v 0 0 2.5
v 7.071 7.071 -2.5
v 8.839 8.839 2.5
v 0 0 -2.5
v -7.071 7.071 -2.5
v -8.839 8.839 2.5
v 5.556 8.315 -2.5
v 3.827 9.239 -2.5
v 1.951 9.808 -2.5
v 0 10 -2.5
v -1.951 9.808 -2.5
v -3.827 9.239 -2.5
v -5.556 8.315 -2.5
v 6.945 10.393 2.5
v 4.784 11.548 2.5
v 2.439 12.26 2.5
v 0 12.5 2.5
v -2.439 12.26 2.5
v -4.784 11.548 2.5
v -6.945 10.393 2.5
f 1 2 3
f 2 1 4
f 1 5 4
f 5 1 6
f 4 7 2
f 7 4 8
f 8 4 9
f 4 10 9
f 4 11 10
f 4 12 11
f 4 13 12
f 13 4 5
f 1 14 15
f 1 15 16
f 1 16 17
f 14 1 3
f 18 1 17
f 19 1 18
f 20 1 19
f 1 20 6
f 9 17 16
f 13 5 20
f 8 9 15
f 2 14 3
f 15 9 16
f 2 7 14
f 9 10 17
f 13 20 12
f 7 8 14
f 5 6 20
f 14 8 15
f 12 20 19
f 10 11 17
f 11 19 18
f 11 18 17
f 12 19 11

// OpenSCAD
// file: Cone.scad
// Auther: Tobias Grundtvig
// Date: Oct 1, 2020
//
// A cone, wraps the build-in cylinder module, to get consistent naming

Cone(bottom_diameter=20, top_diameter=10, height=10, t_x="neg");

module Cone(bottom_diameter,
            top_diameter,
            height,
            t_x="center",
            t_y="center",
            t_z="center",
            angular_resolution=32)
{
    max_d = max(bottom_diameter, top_diameter);
    tx = t_x == "neg" ? -max_d/2 : 
            t_x == "pos" ? max_d/2 : 0;
    ty = t_y == "neg" ? -max_d/2 : 
            t_y == "pos" ? max_d/2 : 0;
    tz = t_z == "neg" ? -height/2 : 
            t_z == "pos" ? height/2 : 0;
    translate([tx,ty,tz])
    cylinder(d1=bottom_diameter, d2=top_diameter, h=height, center=true, $fn=angular_resolution);
}
// file: Pie_2D.scad
// Auther: Tobias Grundtvig
// Date: Oct 1, 2020
//
//  A 2-dimensional pie
//  can be used to linear-extract a 3D Pie


Pie_2D(diameter=10, from_angle=45, to_angle=315, steps=32);
translate([2,0,0])
Pie_2D(diameter=10, from_angle=315, to_angle=45, steps=32);

module Pie_2D(diameter, from_angle, to_angle, steps=32)
{
    step_size = from_angle < to_angle ?
                (to_angle-from_angle)/steps :
                (360 - (from_angle-to_angle))/steps;
    r=diameter/2;
    points = from_angle < to_angle ?
        [
            for(i = [0:steps])
            [r * cos(from_angle+i*step_size), r * sin(from_angle+i*step_size)]
        ] :
        [
            for(i = [0:steps])
            [r * cos(from_angle+i*step_size), r * sin(from_angle+i*step_size)]
        ];
            
    polygon(concat([[0, 0]], points));
}
// main file
// Auther: Tobias Grundtvig
// Date: Oct 1, 2020
//
// A segment of a cone

use <Pie_2D.scad>
use <Cone.scad>

Cone_Segment(bottom_diameter=20, top_diameter=25, height=5, from_angle=45, to_angle=135);

module Cone_Segment(bottom_diameter,
                    top_diameter,
                    height,
                    from_angle,
                    to_angle,
                    t_x="center",
                    t_y="center",
                    t_z="center",
                    angular_resolution=32)
{
    max_d=max(bottom_diameter, top_diameter);
    tx = t_x == "neg" ? -max_d/2 : 
            t_x == "pos" ? max_d/2 : 0;
    ty = t_y == "neg" ? -max_d/2 : 
            t_y == "pos" ? max_d/2 : 0;
    tz = t_z == "neg" ? -height/2 : 
            t_z == "pos" ? height/2 : 0;
    translate([tx, ty, tz])
    intersection()
    {
        linear_extrude(height=height, center=true)
        {
            Pie_2D
            (
                diameter=max(bottom_diameter, top_diameter)*2,
                from_angle=from_angle,
                to_angle=to_angle,
                steps = 8
            );
        }
        Cone(   bottom_diameter=bottom_diameter,
                top_diameter=top_diameter,
                height=height,
                angular_resolution=angular_resolution);
    }
}
